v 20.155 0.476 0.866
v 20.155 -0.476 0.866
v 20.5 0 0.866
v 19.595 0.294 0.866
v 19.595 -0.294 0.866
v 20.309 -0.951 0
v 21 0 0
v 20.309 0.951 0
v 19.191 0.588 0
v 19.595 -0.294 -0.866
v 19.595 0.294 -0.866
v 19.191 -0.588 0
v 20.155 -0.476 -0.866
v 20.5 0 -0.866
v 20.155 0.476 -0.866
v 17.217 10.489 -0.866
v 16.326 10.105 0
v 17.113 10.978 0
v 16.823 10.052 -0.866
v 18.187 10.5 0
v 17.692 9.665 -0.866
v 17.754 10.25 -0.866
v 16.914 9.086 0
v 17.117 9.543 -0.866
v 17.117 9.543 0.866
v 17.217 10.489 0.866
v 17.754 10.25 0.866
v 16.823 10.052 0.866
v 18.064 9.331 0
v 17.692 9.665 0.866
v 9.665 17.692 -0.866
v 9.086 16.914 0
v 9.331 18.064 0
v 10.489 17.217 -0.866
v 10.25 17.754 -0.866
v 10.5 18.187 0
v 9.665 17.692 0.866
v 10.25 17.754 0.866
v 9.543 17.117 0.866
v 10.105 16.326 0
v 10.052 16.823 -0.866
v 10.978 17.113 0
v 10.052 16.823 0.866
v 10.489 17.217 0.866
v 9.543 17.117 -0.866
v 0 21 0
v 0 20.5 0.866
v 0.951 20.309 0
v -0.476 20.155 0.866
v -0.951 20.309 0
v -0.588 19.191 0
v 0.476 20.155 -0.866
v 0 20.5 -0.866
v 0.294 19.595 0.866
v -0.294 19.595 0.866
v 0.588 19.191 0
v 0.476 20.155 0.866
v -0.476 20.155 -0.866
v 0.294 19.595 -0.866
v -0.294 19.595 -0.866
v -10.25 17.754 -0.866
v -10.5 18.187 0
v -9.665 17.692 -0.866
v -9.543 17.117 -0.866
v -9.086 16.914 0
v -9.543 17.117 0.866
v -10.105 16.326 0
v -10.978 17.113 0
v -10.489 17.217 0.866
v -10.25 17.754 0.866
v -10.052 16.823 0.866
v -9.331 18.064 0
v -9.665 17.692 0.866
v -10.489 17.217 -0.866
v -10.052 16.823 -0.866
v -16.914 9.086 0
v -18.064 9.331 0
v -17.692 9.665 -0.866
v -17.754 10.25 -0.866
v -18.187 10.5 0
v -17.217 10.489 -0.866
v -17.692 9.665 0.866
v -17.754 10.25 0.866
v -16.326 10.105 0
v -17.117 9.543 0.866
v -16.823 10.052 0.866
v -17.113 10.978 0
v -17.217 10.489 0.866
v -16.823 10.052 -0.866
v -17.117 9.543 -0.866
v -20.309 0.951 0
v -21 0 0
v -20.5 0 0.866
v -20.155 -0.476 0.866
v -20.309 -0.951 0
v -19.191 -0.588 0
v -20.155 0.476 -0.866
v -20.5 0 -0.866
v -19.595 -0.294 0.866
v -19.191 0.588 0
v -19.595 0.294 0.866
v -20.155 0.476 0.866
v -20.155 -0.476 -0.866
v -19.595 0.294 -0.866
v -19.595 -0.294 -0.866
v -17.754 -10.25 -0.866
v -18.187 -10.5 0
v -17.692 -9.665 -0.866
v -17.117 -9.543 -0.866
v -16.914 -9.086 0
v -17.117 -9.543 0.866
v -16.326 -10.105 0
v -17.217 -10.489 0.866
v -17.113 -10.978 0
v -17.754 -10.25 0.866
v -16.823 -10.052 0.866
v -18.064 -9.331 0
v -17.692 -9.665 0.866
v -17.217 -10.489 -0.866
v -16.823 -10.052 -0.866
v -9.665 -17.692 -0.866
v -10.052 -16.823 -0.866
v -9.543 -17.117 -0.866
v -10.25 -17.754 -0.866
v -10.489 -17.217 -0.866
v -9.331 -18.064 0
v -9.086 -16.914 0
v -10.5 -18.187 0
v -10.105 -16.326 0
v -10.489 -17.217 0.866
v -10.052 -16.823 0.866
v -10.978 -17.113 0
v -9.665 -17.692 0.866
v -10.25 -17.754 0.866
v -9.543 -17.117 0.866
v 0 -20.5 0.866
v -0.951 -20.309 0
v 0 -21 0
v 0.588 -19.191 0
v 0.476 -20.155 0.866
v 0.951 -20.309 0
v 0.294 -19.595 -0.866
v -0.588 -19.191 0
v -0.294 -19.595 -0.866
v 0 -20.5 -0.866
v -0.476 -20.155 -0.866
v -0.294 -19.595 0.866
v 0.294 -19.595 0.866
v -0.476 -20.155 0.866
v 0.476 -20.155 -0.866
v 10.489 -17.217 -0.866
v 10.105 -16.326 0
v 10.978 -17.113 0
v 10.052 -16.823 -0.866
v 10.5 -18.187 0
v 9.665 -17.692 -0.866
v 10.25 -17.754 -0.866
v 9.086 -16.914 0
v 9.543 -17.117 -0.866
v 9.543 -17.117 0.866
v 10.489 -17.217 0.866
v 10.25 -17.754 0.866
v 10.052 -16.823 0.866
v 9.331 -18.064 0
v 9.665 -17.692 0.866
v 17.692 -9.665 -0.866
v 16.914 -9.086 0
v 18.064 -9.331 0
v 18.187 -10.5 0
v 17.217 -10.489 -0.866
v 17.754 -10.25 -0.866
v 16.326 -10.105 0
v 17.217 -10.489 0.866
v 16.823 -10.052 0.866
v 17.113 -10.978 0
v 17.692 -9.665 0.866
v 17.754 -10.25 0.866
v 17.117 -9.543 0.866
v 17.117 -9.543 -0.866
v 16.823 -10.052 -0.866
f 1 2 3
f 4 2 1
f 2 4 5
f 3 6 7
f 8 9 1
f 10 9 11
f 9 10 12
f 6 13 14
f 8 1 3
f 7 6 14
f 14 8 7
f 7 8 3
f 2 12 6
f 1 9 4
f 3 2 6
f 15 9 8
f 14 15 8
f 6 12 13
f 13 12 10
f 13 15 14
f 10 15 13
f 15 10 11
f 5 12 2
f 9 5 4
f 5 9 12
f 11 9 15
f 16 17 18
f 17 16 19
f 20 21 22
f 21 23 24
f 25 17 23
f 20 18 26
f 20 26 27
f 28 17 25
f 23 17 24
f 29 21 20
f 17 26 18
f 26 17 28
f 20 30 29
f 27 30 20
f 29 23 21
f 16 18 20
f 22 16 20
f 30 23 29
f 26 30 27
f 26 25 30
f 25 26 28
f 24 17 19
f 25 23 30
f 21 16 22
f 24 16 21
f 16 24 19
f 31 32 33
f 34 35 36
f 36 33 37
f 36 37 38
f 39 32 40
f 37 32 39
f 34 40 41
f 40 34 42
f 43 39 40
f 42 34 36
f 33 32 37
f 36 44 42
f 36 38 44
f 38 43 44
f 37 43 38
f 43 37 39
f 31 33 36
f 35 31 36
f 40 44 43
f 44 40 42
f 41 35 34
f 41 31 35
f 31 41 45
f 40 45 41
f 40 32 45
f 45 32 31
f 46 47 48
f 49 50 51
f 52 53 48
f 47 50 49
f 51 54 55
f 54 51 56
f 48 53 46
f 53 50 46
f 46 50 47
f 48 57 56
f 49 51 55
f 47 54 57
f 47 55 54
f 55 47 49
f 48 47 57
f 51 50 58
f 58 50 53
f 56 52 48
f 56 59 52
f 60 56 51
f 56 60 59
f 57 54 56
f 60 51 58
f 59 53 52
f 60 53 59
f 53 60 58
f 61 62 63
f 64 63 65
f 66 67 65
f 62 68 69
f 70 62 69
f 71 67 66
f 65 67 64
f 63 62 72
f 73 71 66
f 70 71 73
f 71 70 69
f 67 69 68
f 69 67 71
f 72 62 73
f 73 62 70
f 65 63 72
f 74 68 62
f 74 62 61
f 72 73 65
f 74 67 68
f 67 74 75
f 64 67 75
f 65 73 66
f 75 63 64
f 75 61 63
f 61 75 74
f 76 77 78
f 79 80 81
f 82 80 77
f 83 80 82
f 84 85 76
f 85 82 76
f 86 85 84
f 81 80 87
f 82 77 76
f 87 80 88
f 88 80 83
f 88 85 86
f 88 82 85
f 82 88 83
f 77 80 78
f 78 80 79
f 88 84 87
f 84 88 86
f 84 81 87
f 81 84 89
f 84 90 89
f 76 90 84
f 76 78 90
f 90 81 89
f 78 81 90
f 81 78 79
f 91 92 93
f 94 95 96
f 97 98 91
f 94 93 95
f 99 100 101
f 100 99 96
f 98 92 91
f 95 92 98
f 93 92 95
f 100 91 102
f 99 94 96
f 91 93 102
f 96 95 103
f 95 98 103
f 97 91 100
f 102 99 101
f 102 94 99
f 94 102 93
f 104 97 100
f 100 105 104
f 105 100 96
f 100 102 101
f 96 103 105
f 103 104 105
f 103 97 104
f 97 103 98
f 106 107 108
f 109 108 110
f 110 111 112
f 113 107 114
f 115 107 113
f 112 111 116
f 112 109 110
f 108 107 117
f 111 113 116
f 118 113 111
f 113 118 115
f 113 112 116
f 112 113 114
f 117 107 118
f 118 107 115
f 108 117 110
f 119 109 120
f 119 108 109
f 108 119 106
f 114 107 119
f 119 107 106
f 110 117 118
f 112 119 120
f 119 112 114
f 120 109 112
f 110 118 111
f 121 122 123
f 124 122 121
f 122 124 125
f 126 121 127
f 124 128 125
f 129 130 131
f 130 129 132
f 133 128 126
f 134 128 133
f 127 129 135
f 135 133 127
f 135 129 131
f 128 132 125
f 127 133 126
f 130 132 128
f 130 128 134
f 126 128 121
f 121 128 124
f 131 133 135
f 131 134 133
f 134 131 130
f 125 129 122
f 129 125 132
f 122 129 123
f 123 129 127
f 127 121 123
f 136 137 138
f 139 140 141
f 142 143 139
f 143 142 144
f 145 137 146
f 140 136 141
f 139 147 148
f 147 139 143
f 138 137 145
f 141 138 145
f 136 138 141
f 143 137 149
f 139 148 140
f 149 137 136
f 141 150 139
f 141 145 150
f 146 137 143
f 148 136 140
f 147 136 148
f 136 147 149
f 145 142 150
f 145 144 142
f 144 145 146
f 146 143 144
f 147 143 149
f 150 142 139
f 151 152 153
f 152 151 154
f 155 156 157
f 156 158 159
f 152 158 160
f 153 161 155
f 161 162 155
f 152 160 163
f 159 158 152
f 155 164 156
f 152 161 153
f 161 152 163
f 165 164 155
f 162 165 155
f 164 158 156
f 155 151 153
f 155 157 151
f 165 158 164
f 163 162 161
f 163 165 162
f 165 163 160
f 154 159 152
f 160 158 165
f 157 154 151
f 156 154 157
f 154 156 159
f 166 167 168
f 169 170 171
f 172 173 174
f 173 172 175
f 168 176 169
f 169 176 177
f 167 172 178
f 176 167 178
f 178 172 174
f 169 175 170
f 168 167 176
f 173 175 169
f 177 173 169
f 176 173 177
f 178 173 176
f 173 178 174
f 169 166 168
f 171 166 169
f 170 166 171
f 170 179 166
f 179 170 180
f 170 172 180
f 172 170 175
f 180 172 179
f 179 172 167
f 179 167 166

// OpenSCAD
// list comprehensions, let(), each, ranges
radii = [for (i = [0:4]) i * 2 + 1];

points = [for (a = [0:30:359]) [10 * cos(a), 10 * sin(a)]];

flattened = [each [1, 2, 3], each [4, 5], 6];

module ring(n=8, r=15) {
    let (step = 360 / n)
        for (i = [0:n-1])
            rotate([0, 0, i * step])
                translate([r, 0, 0])
                    sphere(1);
}

ring(12, 20);

filtered = [for (x = [0:20]) if (x % 2 == 0) x];

nested = [for (x = [0:2]) for (y = [0:2]) [x, y]];
